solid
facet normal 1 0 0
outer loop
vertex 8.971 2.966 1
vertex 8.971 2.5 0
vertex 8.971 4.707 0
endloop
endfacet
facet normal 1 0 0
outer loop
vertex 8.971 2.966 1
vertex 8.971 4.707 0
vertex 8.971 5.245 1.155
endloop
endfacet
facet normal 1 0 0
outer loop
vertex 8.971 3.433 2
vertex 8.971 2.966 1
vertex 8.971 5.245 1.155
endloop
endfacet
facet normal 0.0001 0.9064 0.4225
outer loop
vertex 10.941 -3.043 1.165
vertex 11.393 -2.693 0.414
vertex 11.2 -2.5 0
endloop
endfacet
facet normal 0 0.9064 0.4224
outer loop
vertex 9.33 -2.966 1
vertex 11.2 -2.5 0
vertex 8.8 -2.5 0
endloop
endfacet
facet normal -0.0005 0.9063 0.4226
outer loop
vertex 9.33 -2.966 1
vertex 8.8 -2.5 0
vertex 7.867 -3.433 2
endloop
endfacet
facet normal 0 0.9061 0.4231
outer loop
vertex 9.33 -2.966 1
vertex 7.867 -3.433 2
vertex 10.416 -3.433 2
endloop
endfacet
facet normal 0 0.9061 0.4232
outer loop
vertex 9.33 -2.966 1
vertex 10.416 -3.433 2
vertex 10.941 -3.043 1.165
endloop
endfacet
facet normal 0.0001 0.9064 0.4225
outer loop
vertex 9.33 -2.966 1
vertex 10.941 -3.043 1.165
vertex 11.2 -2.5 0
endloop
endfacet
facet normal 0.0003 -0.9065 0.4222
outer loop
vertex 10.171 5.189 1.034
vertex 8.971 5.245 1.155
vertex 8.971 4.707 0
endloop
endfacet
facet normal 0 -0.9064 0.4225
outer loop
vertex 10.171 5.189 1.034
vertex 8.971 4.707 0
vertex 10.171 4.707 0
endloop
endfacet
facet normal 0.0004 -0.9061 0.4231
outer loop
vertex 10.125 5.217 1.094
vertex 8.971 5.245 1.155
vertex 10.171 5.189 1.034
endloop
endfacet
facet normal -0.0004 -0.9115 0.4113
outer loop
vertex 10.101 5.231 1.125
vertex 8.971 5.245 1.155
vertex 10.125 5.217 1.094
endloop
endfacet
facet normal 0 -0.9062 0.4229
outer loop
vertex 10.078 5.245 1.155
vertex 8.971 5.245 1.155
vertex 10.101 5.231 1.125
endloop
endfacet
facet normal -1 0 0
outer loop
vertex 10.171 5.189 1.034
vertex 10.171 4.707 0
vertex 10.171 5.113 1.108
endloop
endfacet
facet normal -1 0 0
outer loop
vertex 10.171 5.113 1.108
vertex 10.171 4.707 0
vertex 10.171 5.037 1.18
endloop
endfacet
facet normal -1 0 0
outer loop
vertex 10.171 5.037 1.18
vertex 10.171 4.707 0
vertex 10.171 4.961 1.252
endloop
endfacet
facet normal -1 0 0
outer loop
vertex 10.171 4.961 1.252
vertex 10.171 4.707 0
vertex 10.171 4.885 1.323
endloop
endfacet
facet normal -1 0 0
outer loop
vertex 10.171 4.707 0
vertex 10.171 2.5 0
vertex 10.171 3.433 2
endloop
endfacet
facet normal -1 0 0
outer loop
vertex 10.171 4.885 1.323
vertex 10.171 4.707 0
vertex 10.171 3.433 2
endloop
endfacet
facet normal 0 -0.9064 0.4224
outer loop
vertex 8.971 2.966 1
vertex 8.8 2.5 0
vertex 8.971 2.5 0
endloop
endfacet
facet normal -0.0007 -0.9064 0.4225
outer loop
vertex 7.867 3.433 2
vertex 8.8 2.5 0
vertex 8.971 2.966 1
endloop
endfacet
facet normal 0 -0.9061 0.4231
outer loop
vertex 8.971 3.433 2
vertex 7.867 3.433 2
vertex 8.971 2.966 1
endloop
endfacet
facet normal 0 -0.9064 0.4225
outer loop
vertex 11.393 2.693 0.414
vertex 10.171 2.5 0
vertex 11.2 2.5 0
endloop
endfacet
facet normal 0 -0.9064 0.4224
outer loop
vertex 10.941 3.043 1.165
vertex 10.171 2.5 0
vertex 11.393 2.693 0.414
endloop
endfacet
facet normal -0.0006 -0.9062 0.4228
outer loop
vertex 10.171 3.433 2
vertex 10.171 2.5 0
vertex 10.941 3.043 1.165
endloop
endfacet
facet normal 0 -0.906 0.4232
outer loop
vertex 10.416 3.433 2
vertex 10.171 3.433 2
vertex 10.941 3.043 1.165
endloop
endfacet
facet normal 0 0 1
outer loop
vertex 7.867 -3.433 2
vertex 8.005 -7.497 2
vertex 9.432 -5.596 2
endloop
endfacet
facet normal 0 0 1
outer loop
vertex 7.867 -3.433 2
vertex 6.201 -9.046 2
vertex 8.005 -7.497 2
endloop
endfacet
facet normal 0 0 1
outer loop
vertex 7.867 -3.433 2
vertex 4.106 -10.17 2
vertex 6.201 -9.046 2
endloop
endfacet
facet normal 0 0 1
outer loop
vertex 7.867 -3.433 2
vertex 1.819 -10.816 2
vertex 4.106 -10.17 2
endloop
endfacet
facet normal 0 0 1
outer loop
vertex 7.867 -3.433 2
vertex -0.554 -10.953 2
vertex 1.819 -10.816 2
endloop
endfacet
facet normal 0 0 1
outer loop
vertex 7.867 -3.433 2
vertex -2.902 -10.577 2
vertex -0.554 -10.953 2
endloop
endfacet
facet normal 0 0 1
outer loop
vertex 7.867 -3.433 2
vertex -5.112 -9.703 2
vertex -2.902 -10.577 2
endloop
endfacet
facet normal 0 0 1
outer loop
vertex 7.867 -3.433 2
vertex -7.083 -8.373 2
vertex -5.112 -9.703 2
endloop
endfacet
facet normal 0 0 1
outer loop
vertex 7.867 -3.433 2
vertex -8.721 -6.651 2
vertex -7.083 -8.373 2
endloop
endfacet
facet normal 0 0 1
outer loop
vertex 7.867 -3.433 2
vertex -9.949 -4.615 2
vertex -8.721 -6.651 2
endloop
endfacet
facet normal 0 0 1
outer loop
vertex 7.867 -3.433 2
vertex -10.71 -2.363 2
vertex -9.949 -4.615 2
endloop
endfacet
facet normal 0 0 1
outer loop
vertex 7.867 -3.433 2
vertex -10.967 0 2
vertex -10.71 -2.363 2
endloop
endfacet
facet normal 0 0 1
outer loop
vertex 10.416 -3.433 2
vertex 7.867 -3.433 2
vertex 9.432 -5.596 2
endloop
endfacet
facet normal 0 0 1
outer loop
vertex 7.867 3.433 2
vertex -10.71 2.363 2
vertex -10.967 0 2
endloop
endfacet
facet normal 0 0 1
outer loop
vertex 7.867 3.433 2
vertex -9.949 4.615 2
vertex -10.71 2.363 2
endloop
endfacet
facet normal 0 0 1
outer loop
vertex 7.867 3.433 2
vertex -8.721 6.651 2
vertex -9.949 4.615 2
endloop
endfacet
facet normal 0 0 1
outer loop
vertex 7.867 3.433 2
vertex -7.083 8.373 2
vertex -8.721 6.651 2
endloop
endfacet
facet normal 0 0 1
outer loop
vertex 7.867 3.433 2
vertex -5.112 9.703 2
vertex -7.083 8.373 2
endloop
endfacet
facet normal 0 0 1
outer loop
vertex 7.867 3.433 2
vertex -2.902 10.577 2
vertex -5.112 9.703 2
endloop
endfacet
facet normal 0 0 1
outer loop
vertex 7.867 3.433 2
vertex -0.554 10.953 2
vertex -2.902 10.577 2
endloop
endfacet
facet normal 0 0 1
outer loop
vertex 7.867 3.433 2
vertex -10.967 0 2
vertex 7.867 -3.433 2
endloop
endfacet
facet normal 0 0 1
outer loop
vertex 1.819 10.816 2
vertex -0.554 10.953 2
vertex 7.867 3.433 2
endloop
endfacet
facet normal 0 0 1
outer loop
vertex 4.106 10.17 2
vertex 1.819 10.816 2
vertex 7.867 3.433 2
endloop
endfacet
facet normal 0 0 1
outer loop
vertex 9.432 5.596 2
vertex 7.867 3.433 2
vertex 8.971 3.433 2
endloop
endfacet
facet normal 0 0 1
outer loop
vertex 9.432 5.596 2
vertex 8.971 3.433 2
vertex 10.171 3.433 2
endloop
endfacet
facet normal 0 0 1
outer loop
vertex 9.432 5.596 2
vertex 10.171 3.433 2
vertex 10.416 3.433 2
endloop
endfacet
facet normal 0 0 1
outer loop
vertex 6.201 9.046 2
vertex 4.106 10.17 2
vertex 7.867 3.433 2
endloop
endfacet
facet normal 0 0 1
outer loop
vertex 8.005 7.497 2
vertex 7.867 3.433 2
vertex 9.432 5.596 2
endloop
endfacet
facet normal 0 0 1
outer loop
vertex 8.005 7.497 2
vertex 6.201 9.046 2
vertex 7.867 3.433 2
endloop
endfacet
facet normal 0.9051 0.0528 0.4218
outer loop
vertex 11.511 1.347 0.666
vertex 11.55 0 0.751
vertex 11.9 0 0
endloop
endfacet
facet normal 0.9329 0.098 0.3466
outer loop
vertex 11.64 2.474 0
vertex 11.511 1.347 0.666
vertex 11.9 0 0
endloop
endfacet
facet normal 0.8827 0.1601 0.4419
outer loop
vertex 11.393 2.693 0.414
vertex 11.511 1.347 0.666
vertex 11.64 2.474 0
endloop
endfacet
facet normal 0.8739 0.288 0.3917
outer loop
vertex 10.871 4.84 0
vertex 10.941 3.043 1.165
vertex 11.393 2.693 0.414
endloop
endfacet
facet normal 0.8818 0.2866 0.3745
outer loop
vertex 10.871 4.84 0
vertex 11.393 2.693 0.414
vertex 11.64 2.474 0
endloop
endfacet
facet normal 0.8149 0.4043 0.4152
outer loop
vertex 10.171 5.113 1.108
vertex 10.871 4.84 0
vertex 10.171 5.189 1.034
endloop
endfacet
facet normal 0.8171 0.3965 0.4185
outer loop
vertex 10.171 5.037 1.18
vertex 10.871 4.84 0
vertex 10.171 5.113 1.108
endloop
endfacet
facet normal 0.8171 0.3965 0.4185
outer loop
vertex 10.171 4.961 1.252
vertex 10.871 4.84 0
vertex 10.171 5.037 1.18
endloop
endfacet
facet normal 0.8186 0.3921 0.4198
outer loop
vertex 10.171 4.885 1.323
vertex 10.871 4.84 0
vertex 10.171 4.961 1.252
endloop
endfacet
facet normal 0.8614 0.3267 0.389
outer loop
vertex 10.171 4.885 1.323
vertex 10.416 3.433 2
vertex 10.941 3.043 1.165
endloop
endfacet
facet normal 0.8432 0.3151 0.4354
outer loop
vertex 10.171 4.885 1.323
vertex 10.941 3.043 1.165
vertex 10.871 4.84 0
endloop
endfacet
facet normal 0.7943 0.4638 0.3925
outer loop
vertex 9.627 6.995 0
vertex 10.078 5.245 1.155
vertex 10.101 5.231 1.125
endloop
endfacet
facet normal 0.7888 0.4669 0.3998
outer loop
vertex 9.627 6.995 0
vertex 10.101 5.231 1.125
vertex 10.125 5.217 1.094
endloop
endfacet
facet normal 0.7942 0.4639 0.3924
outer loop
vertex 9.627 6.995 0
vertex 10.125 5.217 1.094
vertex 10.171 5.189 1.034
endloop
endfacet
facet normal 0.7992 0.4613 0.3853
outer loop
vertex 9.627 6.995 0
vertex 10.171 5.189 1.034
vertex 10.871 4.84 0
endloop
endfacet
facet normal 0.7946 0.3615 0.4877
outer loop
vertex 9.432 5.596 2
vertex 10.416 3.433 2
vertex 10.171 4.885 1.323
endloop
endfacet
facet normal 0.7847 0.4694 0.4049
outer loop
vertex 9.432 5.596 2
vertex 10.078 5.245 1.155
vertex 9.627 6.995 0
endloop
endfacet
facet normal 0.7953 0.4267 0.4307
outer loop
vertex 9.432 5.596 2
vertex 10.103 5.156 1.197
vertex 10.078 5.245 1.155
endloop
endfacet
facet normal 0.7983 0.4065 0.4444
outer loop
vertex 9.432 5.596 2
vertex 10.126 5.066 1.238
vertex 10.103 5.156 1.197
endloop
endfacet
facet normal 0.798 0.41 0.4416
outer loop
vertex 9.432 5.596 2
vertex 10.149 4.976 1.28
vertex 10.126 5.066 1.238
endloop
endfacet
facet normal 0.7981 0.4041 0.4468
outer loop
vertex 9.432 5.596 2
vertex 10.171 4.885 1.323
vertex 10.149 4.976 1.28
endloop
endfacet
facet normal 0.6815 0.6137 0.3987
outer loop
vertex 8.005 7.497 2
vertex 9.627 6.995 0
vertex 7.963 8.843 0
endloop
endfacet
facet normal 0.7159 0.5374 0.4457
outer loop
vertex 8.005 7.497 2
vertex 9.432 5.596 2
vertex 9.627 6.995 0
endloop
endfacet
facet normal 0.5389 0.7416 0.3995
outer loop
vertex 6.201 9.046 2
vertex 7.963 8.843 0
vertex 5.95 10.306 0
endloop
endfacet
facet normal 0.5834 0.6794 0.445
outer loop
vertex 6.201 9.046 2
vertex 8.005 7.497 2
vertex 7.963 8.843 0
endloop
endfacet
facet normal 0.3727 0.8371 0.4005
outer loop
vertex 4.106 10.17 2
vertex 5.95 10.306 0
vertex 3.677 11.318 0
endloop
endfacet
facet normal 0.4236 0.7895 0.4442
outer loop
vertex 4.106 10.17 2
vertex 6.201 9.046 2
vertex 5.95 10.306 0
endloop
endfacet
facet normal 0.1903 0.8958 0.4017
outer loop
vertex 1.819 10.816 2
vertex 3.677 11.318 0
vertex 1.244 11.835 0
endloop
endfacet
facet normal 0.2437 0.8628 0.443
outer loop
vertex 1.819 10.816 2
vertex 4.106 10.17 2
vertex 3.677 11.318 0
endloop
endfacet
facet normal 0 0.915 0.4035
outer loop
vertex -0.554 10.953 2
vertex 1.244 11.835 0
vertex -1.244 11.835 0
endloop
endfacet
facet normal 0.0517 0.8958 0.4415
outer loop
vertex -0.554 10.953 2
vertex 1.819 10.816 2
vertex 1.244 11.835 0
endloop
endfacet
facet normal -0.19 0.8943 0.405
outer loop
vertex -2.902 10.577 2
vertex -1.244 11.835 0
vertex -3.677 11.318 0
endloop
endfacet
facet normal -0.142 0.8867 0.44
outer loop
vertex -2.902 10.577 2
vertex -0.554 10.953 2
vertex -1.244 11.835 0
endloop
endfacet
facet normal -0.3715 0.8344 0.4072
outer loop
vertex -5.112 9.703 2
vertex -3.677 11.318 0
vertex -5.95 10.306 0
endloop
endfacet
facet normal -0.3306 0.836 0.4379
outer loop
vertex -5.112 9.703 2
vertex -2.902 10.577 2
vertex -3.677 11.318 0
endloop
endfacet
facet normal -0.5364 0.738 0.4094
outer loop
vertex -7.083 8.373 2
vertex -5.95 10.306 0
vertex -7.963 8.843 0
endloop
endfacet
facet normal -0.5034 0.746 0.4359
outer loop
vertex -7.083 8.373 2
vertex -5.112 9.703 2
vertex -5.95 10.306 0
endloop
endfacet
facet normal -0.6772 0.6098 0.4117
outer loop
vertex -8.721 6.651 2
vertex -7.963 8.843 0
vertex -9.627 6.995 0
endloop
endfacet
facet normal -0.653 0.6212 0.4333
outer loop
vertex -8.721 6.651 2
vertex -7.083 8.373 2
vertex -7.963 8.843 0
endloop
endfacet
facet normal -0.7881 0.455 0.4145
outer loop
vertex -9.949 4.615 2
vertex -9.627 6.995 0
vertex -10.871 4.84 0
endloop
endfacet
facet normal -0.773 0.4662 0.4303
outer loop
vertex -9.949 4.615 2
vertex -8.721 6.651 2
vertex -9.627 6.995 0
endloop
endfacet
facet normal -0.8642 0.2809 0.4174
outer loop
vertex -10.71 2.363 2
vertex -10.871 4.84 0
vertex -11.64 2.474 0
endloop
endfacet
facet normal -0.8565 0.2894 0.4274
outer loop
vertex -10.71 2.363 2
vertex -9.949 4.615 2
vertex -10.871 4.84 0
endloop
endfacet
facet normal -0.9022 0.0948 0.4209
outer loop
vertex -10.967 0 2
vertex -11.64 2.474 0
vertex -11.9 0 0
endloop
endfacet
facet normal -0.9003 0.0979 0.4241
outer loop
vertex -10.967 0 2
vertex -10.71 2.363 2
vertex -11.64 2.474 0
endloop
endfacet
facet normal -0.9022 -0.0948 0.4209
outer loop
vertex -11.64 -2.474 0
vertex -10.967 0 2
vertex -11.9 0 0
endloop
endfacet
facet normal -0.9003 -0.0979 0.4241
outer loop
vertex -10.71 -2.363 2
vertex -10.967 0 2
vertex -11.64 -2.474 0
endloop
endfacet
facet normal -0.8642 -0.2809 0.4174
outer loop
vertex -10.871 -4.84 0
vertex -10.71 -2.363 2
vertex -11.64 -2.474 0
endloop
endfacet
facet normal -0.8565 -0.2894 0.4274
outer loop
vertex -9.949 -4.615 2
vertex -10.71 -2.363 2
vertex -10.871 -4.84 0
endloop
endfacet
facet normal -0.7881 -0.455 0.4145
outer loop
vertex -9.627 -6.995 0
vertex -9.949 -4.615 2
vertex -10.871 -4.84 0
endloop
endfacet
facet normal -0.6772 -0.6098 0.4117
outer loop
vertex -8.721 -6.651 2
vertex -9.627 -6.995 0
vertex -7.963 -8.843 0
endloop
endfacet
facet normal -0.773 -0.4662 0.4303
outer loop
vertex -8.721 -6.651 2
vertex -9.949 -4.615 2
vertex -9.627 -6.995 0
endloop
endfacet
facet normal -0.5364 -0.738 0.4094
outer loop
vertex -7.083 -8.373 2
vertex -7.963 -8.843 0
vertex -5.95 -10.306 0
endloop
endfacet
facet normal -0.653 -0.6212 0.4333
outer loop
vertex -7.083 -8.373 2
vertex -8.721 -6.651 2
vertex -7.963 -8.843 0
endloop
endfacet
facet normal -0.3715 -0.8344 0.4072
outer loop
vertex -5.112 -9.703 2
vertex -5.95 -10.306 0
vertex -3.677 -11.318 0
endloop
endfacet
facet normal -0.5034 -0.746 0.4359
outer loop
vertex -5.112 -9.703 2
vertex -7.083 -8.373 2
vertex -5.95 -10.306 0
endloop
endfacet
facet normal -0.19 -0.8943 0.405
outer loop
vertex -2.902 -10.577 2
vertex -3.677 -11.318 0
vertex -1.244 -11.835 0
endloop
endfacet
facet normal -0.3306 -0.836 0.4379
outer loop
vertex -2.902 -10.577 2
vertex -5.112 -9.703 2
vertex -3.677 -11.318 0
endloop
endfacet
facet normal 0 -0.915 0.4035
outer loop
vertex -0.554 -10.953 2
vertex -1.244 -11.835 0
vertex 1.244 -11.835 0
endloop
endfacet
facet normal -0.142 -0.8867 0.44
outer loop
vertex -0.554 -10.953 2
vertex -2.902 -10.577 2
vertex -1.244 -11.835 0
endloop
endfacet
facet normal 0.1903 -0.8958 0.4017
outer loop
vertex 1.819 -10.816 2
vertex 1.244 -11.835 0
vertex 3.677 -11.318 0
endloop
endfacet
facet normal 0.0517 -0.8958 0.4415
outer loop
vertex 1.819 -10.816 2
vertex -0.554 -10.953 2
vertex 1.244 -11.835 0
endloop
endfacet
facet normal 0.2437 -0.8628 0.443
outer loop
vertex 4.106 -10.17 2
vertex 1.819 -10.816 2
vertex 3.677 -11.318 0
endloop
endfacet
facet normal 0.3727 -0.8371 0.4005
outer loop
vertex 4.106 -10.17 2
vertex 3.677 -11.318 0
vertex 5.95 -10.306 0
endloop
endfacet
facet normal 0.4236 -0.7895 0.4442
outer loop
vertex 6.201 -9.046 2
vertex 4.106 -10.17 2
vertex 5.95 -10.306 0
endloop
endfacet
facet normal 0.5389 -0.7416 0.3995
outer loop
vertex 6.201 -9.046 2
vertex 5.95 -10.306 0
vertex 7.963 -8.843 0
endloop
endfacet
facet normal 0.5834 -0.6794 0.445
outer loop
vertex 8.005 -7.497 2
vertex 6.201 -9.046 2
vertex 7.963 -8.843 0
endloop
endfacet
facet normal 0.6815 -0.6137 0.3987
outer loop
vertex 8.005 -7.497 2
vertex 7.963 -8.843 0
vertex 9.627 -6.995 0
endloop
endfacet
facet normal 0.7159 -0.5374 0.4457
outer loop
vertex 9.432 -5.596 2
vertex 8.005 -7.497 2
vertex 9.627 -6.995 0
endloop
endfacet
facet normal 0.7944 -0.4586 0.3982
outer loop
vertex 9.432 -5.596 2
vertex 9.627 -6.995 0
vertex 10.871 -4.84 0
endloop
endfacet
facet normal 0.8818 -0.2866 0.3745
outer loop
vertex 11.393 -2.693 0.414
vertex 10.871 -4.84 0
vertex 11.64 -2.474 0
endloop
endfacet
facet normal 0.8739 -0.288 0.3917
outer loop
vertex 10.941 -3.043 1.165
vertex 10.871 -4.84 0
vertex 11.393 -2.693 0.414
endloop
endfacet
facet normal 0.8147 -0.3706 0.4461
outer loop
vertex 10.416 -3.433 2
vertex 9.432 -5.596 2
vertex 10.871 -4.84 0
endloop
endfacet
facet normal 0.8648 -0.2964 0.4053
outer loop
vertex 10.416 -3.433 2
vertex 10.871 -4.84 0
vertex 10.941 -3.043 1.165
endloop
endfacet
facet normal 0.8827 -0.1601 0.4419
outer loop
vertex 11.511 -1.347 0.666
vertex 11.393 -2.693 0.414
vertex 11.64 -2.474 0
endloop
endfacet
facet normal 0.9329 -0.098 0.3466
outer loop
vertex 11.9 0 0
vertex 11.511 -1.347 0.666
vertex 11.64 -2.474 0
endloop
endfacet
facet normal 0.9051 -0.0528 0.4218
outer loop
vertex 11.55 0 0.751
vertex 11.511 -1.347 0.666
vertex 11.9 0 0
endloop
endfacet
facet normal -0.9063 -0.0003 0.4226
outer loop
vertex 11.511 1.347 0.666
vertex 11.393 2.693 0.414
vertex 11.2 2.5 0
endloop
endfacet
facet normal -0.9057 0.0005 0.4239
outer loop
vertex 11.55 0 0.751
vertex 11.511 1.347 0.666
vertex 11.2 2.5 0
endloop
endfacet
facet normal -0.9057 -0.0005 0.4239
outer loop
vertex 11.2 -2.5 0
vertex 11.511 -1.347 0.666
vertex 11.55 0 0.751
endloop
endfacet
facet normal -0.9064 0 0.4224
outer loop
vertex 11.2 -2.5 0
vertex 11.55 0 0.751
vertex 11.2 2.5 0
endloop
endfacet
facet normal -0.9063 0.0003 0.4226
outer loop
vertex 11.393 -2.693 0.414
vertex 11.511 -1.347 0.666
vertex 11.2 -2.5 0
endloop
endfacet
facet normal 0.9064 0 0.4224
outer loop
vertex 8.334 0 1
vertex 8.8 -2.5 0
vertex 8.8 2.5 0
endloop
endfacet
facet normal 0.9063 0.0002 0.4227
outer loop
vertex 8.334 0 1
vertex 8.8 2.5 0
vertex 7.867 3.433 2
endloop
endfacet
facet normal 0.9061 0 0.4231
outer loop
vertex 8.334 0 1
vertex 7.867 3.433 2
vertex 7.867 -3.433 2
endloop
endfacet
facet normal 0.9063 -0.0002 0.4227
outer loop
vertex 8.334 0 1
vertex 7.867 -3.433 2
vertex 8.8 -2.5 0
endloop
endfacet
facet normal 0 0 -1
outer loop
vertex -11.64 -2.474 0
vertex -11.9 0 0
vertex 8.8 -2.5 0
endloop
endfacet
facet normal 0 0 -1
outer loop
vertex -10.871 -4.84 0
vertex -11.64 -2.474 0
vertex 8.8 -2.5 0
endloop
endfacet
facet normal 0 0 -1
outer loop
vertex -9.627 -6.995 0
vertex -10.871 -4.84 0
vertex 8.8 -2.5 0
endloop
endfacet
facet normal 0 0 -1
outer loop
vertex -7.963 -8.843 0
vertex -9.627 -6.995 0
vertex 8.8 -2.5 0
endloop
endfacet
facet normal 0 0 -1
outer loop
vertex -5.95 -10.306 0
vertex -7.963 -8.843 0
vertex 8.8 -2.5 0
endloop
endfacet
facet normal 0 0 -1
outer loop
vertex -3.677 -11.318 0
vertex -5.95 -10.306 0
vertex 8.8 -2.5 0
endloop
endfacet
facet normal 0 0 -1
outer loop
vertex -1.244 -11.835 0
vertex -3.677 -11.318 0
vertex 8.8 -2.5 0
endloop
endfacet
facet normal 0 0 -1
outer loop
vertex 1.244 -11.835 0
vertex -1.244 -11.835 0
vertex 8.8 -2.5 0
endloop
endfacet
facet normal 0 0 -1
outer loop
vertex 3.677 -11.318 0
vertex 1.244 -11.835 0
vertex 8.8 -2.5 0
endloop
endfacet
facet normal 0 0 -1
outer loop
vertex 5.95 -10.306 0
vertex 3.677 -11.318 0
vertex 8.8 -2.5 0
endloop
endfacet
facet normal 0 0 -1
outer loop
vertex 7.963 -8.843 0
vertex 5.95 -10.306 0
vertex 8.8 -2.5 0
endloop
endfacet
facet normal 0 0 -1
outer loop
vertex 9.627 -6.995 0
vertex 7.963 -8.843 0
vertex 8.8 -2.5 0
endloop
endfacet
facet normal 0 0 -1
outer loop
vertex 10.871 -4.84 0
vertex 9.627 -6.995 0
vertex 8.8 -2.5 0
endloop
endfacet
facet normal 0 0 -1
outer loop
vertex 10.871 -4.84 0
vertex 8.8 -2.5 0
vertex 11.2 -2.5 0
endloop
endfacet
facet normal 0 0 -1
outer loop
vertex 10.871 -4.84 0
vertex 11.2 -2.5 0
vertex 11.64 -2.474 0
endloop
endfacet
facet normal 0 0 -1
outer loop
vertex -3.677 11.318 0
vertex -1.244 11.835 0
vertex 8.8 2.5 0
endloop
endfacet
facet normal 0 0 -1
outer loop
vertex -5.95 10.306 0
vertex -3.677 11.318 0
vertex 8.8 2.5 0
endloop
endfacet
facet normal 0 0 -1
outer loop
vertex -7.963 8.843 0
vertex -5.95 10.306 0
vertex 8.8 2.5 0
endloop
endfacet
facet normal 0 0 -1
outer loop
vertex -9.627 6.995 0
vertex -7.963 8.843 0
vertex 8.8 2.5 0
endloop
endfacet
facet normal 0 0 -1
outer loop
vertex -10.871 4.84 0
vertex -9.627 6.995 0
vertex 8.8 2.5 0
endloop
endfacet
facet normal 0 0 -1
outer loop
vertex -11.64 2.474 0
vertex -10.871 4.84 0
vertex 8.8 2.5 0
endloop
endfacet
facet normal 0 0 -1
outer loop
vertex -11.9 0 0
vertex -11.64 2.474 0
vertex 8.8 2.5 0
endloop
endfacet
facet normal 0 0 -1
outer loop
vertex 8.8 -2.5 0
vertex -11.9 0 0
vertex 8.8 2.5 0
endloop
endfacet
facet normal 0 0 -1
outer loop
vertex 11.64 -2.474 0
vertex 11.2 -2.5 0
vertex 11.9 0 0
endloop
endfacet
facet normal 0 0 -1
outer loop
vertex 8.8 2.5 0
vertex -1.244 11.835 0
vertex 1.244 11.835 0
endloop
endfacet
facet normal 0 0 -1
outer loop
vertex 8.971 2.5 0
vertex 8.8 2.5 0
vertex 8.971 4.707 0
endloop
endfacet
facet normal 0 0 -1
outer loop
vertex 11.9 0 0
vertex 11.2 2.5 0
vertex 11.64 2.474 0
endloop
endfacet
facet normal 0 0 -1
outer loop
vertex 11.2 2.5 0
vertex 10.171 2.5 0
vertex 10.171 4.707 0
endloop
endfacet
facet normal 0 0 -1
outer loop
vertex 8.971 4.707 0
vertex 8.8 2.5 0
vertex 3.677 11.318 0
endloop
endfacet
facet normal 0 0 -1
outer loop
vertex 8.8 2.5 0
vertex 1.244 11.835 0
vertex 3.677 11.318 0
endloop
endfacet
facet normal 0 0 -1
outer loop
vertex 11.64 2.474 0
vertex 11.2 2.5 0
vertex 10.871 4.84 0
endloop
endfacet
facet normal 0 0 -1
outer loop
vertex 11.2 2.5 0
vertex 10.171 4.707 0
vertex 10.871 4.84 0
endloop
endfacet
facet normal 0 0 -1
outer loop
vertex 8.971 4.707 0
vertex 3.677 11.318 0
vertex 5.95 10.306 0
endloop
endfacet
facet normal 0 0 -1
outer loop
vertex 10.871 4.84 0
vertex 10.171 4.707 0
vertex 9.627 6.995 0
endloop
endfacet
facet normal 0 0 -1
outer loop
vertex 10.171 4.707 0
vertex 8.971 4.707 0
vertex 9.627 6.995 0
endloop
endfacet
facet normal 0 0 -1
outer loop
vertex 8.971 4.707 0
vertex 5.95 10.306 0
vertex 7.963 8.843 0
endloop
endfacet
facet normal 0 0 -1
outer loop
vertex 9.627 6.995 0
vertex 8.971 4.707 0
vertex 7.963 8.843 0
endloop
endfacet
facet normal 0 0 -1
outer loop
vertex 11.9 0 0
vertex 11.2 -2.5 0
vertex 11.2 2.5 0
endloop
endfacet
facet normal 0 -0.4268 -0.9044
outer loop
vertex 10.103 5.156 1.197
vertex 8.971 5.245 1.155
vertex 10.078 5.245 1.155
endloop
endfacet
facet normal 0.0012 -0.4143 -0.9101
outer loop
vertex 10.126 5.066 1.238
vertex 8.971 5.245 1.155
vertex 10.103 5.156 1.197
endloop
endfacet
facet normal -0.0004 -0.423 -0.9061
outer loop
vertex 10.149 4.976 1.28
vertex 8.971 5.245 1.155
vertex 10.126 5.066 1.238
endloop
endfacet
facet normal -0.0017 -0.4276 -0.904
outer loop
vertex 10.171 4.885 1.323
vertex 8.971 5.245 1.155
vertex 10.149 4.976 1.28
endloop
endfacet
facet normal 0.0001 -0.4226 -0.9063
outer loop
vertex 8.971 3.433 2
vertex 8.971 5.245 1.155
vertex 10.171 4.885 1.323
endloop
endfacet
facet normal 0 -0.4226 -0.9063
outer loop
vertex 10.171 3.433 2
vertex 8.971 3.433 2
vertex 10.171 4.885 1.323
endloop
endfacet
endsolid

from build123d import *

# Parameters (mm, degrees)
SKETCH1_R           = 11.9
SKETCH1_W           = 2.4
SKETCH1_H           = 5
BOSS_EXTRUDE2_DEPTH = 2
BOSS_EXTRUDE2_TAPER = 25
SKETCH4_W           = 1.199715213
SKETCH4_H           = 2.206755838
CUT_EXTRUDE1_DEPTH  = 2


with BuildPart() as part:
    # Sketch1 → Boss-Extrude2 (new body)
    with BuildSketch(Plane.XY):
        Circle(SKETCH1_R)
        with Locations((10, 0)):
            Rectangle(SKETCH1_W, SKETCH1_H, mode=Mode.SUBTRACT)
    extrude(amount=BOSS_EXTRUDE2_DEPTH, taper=BOSS_EXTRUDE2_TAPER)

    # Sketch4 → Cut-Extrude1 (cut)
    with BuildSketch(Plane(origin=(0, 2.053484512, -0.957555554), x_dir=(1, 0, 0), z_dir=(0, -0.9063077870366496, 0.42261826174070033))):
        with Locations((9.570937649, 2.159923573)):
            Rectangle(SKETCH4_W, SKETCH4_H)
    extrude(amount=-CUT_EXTRUDE1_DEPTH, mode=Mode.SUBTRACT)


solid = part.part
